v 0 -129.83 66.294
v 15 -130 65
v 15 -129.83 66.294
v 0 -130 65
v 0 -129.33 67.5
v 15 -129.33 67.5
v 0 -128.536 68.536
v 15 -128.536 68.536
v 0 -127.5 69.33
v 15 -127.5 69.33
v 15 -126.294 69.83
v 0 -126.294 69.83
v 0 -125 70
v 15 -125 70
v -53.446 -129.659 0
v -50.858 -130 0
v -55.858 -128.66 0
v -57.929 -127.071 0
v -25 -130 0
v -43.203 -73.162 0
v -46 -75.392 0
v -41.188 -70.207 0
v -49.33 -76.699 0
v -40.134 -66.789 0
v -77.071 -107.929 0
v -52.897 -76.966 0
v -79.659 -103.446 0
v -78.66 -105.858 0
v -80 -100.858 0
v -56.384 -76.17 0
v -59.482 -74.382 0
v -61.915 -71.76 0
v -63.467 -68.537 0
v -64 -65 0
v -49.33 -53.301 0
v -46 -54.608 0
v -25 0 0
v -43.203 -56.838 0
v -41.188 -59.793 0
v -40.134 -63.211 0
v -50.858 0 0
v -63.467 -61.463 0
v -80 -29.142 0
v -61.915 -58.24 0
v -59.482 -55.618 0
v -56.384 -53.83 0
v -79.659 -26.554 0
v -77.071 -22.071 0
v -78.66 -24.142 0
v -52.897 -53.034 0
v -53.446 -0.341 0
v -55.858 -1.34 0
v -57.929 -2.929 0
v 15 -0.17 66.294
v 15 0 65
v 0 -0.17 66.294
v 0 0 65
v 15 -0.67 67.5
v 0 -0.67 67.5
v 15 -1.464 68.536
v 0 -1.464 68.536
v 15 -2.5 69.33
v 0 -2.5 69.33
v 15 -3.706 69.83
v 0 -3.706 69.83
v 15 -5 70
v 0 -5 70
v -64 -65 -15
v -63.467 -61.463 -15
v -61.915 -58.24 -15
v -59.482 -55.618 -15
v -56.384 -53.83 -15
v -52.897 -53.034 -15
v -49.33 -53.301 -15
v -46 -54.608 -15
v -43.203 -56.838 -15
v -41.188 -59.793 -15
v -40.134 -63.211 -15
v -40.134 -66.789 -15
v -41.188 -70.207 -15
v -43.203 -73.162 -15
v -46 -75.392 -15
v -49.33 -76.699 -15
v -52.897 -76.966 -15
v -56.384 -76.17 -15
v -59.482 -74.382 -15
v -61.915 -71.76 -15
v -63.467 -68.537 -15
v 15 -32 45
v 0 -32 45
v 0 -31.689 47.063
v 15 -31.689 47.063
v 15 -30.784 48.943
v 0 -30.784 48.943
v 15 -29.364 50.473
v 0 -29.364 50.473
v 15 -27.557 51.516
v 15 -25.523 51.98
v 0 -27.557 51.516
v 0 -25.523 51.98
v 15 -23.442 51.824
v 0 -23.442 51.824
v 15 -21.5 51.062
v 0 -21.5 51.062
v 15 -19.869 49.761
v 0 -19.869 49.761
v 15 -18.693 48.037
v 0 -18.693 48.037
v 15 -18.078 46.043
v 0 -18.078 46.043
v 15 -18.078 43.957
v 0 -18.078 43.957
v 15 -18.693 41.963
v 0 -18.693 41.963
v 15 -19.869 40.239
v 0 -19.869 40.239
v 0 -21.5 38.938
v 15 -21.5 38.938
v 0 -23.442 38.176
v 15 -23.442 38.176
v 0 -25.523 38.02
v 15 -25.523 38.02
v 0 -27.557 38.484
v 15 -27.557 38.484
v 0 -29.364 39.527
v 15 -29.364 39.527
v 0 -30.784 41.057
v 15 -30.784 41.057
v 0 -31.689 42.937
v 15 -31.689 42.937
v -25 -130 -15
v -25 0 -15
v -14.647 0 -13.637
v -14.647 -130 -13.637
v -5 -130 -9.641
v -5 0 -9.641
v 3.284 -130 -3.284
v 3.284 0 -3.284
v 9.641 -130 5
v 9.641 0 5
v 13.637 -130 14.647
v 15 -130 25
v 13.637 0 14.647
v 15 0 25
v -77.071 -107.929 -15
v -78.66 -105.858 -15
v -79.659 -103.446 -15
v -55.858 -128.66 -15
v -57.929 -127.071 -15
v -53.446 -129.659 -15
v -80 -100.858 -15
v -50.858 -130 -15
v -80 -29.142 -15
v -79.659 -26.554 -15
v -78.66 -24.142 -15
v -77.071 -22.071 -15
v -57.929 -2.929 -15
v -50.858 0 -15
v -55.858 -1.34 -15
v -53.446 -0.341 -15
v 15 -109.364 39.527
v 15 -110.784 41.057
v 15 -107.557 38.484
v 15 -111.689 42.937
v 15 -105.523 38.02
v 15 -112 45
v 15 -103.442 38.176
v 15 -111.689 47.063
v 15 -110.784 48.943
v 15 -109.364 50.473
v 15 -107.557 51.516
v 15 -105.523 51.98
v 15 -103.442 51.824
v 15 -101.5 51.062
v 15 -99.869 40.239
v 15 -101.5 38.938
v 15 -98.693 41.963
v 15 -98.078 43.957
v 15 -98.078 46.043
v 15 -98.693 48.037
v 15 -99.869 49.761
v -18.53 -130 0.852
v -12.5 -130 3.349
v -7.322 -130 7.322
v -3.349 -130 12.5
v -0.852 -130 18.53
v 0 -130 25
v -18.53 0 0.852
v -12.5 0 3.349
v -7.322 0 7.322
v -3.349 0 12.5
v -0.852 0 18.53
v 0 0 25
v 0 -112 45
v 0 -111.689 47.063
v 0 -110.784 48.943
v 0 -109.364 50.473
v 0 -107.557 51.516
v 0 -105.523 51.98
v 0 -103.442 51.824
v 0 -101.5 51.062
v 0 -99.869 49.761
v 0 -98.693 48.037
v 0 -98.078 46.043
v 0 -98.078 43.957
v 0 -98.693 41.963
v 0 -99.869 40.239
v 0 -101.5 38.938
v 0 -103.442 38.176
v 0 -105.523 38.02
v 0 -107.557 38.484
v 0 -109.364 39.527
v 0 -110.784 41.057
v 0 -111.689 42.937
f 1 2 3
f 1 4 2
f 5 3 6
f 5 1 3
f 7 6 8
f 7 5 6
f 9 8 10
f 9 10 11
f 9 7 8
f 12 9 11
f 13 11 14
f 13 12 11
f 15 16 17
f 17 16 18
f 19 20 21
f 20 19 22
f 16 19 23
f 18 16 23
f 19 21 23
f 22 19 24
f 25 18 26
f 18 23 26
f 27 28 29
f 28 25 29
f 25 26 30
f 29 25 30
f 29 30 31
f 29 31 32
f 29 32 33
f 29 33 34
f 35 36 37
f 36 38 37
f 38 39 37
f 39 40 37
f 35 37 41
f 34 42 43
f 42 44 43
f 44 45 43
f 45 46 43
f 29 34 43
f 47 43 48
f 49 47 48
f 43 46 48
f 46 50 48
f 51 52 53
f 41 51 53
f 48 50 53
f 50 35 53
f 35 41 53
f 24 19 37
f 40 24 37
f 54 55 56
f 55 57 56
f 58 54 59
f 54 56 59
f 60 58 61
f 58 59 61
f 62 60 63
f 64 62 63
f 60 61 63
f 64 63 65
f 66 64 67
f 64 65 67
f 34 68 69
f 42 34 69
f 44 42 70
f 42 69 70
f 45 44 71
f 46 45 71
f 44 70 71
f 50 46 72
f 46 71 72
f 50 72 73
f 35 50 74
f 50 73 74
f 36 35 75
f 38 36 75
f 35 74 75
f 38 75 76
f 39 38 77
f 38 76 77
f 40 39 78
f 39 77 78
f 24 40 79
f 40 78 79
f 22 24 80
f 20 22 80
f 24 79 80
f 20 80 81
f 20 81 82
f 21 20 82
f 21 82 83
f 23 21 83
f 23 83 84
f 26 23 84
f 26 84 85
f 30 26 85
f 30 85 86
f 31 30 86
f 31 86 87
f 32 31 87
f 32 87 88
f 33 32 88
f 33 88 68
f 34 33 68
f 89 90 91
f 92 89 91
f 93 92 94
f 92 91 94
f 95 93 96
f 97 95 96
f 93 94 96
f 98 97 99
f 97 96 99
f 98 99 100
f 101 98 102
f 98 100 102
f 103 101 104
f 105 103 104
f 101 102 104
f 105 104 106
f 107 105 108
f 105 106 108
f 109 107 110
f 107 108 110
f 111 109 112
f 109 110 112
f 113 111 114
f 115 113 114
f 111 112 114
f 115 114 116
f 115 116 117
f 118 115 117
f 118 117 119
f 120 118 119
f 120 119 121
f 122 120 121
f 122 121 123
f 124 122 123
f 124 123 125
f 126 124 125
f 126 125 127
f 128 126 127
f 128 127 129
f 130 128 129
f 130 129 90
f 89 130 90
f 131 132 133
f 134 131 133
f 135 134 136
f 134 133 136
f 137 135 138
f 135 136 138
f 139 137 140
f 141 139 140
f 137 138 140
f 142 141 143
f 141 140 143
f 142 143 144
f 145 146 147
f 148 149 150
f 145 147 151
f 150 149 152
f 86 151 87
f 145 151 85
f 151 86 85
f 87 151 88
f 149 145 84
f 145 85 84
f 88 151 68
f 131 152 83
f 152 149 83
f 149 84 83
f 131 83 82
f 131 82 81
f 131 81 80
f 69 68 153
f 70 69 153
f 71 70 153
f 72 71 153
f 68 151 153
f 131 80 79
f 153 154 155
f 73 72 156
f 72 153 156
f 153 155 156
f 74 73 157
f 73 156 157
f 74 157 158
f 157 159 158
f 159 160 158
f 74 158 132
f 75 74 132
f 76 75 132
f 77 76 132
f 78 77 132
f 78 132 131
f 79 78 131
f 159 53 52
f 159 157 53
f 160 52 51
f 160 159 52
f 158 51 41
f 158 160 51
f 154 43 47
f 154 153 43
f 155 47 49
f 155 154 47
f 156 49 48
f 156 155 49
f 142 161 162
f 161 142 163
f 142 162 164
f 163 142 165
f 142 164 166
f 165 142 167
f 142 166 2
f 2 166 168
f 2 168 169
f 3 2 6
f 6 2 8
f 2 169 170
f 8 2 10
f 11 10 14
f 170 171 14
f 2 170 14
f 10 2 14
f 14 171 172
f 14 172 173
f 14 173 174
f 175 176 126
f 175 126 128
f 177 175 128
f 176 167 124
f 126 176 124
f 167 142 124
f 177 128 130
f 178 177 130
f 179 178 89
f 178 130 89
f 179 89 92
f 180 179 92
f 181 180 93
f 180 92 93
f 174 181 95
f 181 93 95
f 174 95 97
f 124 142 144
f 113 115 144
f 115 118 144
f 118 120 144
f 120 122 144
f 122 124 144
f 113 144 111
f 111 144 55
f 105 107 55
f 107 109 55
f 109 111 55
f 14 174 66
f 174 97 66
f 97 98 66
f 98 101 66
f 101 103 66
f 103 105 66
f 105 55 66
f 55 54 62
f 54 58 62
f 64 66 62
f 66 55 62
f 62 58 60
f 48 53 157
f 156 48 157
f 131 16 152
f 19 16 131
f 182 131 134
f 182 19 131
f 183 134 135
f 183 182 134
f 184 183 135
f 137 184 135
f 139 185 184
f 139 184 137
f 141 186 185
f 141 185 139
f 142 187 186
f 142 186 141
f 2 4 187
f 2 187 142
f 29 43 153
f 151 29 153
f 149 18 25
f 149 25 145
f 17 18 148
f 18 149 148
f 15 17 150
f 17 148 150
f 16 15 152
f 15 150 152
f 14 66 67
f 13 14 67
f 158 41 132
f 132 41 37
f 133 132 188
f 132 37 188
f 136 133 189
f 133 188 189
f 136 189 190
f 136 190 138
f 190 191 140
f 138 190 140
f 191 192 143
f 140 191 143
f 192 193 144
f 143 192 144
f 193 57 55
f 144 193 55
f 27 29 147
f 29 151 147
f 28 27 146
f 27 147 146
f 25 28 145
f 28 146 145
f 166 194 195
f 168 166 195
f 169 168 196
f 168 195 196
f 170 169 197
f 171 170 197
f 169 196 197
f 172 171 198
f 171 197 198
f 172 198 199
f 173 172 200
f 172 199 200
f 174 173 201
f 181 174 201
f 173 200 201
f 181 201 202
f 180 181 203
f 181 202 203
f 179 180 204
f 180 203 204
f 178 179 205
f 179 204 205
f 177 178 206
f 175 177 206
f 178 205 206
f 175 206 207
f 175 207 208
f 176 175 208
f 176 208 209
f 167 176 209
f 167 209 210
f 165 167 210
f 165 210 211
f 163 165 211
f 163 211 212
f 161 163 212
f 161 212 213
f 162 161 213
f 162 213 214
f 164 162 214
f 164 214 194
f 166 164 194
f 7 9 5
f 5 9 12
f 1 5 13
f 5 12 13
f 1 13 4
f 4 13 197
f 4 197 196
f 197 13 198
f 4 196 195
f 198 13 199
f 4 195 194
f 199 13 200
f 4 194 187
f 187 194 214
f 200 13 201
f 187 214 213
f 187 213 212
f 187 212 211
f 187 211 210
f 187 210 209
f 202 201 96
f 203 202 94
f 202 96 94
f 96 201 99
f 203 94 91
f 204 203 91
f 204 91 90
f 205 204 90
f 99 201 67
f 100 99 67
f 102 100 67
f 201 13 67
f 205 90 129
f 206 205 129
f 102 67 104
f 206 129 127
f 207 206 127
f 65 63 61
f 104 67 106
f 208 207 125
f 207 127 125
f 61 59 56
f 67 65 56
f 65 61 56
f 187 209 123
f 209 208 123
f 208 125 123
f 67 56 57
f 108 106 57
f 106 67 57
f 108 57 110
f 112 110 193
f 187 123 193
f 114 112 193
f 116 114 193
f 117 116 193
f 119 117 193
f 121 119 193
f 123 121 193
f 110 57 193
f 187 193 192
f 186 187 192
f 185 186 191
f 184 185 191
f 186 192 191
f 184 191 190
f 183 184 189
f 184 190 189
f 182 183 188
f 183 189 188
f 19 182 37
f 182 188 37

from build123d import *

# Parameters (mm, degrees)
F1_DEPTH = 130
F2_SIZE  = 25
F4_D     = 24
F6_D     = 14
F7_R     = 10
F8_R     = 5


with BuildPart() as f1:
    # F0 (on Front) → F1 (new body)
    with BuildSketch(Plane.XZ):
        with BuildLine():
            Line((15, 70), (0, 70))
            Line((0, 70), (0, 25))
            ThreePointArc((0, 25), (-7.3223304703, 7.3223304703), (-25, 0))
            Line((-25, 0), (-80, 0))
            Line((-80, 0), (-80, -15))
            Line((-80, -15), (-25, -15))
            ThreePointArc((-25, -15), (3.2842712475, -3.2842712475), (15, 25))
            Line((15, 25), (15, 70))
        make_face()
    extrude(amount=F1_DEPTH)

    # F2
    f2_edges = [f1.edges().sort_by_distance(p)[0] for p in [
        (-80, -130, -7.5),
        (-80, 0, -7.5),
    ]]
    chamfer(f2_edges, length=F2_SIZE)

    # F4 (through all)
    with Locations(Plane.XY):
        with Locations((-52, -65)):
            Hole(F4_D / 2)

    # F6 (through all)
    with Locations(Plane.YZ.offset(15)):
        with Locations((-105, 45), (-25, 45)):
            Hole(F6_D / 2)

    # F7
    f7_edges = [f1.edges().sort_by_distance(p)[0] for p in [
        (-55, 0, -7.5),
        (-80, -25, -7.5),
        (-80, -105, -7.5),
        (-55, -130, -7.5),
    ]]
    fillet(f7_edges, radius=F7_R)

    # F8
    f8_edges = [f1.edges().sort_by_distance(p)[0] for p in [
        (7.5, -130, 70),
        (7.5, 0, 70),
    ]]
    fillet(f8_edges, radius=F8_R)


solid = f1.part
